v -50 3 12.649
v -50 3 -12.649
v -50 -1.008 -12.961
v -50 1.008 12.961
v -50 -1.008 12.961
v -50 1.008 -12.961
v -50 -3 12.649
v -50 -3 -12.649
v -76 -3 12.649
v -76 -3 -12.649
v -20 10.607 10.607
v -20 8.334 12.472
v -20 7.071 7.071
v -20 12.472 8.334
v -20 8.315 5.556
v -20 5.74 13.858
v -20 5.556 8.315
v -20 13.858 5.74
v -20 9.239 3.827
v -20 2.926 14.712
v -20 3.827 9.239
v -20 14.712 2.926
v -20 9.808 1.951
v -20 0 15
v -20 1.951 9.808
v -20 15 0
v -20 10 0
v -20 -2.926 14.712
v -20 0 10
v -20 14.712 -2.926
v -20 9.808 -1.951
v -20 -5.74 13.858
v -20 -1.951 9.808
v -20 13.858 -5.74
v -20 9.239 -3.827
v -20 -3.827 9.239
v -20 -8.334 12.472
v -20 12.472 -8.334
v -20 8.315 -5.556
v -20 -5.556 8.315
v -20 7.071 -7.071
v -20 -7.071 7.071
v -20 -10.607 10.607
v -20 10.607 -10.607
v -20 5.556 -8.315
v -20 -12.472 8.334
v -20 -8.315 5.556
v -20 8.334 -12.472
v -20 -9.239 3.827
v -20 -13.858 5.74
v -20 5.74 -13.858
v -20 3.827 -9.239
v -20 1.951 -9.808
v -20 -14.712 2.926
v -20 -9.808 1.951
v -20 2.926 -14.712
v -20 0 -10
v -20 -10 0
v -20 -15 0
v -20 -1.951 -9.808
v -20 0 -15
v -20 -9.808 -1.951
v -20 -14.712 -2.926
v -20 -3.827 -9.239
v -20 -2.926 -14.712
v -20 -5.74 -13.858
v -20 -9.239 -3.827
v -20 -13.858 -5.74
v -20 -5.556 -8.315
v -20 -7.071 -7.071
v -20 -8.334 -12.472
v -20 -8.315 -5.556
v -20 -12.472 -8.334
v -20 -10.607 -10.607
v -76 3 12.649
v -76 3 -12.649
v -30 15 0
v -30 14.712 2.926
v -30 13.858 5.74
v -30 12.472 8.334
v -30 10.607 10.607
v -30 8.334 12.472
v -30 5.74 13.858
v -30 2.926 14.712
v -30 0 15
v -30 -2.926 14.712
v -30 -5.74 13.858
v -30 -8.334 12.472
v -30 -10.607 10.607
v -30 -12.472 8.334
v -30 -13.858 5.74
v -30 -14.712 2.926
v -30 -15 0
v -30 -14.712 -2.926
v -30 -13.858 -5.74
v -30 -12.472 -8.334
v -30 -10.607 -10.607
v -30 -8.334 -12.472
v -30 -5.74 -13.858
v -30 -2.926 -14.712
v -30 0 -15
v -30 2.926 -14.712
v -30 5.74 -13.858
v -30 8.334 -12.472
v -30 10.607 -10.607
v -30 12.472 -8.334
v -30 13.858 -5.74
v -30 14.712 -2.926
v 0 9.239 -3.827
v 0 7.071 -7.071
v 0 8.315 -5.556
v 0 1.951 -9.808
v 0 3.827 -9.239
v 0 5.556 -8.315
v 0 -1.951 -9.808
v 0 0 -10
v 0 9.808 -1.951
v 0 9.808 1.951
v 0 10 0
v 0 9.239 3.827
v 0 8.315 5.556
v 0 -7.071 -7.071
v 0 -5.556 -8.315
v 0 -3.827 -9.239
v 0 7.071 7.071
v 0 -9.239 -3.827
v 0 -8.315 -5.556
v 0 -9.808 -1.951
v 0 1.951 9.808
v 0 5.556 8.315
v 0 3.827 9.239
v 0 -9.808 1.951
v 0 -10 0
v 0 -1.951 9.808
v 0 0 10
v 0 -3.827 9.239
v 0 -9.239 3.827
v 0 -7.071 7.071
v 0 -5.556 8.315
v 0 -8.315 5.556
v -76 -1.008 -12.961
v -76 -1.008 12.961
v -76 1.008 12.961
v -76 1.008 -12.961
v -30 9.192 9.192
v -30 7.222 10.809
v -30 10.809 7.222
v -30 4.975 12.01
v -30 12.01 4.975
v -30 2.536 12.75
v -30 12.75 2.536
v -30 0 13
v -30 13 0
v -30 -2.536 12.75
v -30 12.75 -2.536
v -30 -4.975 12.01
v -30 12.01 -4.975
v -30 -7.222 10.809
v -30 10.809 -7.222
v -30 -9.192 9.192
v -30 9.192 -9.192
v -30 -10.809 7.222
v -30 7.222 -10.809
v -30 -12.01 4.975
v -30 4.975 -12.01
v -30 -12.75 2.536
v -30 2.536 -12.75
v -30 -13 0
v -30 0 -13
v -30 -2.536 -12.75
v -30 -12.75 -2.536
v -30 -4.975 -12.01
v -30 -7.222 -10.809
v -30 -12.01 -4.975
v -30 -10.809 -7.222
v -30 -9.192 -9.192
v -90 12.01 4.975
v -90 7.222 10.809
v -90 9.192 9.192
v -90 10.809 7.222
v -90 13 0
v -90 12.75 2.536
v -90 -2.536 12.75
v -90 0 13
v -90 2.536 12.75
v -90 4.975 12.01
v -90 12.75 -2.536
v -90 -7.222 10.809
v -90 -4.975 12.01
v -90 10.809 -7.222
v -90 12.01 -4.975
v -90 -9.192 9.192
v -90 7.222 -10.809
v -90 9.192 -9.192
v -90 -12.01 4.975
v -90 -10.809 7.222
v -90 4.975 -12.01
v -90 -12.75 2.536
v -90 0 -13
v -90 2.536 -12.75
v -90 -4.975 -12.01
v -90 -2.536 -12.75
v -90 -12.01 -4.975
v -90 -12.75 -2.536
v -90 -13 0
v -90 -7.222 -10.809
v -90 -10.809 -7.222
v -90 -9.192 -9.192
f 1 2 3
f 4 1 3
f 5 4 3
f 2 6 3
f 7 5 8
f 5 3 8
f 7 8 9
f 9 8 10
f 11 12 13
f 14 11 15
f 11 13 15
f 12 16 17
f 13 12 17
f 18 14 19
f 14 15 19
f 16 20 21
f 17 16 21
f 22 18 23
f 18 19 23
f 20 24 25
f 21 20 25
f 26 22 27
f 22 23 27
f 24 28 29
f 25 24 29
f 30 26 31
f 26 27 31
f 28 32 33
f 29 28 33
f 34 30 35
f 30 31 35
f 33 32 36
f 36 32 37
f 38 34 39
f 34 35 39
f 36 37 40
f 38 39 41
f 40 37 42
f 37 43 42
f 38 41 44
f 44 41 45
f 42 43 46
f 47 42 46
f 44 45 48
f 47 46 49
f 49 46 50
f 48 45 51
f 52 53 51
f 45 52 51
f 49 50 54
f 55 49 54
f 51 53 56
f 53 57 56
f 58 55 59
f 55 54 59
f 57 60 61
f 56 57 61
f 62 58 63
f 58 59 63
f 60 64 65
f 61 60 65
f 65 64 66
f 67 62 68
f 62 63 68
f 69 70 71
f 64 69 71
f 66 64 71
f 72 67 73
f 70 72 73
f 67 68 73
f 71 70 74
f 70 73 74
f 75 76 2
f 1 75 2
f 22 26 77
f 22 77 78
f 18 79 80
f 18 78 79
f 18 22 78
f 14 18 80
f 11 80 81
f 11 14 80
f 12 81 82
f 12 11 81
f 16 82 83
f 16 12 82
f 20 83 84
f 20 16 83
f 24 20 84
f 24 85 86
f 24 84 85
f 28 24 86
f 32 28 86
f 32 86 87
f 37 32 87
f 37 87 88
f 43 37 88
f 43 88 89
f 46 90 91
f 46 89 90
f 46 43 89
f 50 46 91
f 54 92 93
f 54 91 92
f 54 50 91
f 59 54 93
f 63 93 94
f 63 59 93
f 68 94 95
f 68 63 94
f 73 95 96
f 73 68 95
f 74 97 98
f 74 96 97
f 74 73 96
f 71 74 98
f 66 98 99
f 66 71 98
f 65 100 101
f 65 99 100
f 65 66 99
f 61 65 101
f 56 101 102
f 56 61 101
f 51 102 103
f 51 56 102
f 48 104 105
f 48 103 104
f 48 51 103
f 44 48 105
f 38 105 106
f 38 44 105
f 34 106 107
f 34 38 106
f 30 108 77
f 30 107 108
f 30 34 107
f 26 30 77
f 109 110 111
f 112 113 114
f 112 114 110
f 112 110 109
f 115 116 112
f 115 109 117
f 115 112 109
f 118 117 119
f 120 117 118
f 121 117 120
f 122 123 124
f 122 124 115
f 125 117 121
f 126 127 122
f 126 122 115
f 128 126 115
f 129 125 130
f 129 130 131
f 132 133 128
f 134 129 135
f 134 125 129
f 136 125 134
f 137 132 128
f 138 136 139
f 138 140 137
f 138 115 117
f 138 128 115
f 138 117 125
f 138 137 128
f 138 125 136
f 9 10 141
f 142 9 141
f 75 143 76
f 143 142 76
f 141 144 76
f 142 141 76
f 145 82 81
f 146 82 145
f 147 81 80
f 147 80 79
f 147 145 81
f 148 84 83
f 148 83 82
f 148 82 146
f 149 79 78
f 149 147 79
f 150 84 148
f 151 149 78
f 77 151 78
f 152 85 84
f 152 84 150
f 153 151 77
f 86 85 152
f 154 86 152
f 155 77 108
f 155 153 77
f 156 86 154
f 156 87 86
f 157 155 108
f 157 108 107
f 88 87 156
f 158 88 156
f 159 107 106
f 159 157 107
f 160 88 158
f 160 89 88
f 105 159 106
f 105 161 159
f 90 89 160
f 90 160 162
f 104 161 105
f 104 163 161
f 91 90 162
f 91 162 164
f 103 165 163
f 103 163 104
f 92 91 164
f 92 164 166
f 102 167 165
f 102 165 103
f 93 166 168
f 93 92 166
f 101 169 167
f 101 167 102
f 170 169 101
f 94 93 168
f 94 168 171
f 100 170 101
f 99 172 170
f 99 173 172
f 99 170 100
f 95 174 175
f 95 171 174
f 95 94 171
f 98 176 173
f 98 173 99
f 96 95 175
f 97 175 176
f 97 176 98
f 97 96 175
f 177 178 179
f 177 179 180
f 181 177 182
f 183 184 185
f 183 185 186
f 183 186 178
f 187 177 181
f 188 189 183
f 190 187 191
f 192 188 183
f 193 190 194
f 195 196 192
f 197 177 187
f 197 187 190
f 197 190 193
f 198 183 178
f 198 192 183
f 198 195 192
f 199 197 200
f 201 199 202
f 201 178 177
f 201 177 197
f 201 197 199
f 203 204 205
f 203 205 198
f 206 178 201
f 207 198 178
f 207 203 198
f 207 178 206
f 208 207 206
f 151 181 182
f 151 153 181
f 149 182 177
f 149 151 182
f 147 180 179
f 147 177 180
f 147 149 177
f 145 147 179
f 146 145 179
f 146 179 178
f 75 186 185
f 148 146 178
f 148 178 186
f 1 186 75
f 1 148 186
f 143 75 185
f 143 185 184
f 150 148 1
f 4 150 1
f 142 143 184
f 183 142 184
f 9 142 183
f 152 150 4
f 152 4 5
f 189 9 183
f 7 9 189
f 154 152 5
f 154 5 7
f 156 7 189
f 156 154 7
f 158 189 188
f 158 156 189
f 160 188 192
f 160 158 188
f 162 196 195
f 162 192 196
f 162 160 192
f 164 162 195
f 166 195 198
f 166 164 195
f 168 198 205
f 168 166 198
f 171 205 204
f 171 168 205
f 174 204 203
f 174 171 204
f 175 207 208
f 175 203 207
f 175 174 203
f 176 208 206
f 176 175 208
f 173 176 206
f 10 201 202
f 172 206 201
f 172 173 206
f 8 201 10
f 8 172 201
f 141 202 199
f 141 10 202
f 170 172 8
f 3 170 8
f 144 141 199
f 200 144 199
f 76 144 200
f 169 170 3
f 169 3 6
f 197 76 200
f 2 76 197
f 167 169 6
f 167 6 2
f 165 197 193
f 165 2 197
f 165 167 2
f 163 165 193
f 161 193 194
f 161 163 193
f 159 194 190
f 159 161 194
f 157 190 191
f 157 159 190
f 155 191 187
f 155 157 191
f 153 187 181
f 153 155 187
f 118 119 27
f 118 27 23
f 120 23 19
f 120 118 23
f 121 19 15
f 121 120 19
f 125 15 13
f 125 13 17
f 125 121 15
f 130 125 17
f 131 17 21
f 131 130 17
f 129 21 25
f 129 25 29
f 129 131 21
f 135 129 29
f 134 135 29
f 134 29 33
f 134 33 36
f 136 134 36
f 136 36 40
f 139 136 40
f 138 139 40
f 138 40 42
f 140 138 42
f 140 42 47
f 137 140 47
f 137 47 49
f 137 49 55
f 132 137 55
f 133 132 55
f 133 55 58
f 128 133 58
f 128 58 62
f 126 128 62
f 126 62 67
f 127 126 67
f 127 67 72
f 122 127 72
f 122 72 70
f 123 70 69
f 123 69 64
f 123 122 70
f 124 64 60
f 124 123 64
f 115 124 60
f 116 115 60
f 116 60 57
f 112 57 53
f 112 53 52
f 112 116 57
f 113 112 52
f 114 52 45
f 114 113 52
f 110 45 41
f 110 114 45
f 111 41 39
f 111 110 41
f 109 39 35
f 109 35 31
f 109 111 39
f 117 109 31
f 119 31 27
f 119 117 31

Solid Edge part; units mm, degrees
sketch "Sketch1" plane through (0, 0, 0) normal (1, 0, 0) x (0, 1, 0)
  circle A0 centre (0, 0) radius 10
extrude "Protrusion1" add sketch "Sketch1" against normal blind 20
sketch "Sketch2" plane through (-20, 0, 0) normal (-1, 0, 0) x (0, 1, 0)
  circle A0 centre (0, 0) radius 15
extrude "ExtrudedProtrusion_2" add sketch "Sketch2" along normal blind 10
sketch "Sketch3" plane through (-30, 0, 0) normal (-1, 0, 0) x (0, 1, 0)
  circle A0 centre (0, 0) radius 13
extrude "ExtrudedProtrusion_3" add sketch "Sketch3" along normal blind 60
sketch "Sketch4" plane through (0, 0, 0) normal (0, 0, 1) x (1, 0, 0)
  line L0 (-76, 3) -> (-50, 3)
  line L1 (-50, 3) -> (-50, -3)
  line L2 (-50, -3) -> (-76, -3)
  line L3 (-76, -3) -> (-76, 3)
  dimension "D1" = 26
  dimension "D2" = 6
  dimension "D3" = 20
extrude "ExtrudedCutout_1" cut sketch "Sketch4" along normal mid plane 78.6359
properties part number "2"
